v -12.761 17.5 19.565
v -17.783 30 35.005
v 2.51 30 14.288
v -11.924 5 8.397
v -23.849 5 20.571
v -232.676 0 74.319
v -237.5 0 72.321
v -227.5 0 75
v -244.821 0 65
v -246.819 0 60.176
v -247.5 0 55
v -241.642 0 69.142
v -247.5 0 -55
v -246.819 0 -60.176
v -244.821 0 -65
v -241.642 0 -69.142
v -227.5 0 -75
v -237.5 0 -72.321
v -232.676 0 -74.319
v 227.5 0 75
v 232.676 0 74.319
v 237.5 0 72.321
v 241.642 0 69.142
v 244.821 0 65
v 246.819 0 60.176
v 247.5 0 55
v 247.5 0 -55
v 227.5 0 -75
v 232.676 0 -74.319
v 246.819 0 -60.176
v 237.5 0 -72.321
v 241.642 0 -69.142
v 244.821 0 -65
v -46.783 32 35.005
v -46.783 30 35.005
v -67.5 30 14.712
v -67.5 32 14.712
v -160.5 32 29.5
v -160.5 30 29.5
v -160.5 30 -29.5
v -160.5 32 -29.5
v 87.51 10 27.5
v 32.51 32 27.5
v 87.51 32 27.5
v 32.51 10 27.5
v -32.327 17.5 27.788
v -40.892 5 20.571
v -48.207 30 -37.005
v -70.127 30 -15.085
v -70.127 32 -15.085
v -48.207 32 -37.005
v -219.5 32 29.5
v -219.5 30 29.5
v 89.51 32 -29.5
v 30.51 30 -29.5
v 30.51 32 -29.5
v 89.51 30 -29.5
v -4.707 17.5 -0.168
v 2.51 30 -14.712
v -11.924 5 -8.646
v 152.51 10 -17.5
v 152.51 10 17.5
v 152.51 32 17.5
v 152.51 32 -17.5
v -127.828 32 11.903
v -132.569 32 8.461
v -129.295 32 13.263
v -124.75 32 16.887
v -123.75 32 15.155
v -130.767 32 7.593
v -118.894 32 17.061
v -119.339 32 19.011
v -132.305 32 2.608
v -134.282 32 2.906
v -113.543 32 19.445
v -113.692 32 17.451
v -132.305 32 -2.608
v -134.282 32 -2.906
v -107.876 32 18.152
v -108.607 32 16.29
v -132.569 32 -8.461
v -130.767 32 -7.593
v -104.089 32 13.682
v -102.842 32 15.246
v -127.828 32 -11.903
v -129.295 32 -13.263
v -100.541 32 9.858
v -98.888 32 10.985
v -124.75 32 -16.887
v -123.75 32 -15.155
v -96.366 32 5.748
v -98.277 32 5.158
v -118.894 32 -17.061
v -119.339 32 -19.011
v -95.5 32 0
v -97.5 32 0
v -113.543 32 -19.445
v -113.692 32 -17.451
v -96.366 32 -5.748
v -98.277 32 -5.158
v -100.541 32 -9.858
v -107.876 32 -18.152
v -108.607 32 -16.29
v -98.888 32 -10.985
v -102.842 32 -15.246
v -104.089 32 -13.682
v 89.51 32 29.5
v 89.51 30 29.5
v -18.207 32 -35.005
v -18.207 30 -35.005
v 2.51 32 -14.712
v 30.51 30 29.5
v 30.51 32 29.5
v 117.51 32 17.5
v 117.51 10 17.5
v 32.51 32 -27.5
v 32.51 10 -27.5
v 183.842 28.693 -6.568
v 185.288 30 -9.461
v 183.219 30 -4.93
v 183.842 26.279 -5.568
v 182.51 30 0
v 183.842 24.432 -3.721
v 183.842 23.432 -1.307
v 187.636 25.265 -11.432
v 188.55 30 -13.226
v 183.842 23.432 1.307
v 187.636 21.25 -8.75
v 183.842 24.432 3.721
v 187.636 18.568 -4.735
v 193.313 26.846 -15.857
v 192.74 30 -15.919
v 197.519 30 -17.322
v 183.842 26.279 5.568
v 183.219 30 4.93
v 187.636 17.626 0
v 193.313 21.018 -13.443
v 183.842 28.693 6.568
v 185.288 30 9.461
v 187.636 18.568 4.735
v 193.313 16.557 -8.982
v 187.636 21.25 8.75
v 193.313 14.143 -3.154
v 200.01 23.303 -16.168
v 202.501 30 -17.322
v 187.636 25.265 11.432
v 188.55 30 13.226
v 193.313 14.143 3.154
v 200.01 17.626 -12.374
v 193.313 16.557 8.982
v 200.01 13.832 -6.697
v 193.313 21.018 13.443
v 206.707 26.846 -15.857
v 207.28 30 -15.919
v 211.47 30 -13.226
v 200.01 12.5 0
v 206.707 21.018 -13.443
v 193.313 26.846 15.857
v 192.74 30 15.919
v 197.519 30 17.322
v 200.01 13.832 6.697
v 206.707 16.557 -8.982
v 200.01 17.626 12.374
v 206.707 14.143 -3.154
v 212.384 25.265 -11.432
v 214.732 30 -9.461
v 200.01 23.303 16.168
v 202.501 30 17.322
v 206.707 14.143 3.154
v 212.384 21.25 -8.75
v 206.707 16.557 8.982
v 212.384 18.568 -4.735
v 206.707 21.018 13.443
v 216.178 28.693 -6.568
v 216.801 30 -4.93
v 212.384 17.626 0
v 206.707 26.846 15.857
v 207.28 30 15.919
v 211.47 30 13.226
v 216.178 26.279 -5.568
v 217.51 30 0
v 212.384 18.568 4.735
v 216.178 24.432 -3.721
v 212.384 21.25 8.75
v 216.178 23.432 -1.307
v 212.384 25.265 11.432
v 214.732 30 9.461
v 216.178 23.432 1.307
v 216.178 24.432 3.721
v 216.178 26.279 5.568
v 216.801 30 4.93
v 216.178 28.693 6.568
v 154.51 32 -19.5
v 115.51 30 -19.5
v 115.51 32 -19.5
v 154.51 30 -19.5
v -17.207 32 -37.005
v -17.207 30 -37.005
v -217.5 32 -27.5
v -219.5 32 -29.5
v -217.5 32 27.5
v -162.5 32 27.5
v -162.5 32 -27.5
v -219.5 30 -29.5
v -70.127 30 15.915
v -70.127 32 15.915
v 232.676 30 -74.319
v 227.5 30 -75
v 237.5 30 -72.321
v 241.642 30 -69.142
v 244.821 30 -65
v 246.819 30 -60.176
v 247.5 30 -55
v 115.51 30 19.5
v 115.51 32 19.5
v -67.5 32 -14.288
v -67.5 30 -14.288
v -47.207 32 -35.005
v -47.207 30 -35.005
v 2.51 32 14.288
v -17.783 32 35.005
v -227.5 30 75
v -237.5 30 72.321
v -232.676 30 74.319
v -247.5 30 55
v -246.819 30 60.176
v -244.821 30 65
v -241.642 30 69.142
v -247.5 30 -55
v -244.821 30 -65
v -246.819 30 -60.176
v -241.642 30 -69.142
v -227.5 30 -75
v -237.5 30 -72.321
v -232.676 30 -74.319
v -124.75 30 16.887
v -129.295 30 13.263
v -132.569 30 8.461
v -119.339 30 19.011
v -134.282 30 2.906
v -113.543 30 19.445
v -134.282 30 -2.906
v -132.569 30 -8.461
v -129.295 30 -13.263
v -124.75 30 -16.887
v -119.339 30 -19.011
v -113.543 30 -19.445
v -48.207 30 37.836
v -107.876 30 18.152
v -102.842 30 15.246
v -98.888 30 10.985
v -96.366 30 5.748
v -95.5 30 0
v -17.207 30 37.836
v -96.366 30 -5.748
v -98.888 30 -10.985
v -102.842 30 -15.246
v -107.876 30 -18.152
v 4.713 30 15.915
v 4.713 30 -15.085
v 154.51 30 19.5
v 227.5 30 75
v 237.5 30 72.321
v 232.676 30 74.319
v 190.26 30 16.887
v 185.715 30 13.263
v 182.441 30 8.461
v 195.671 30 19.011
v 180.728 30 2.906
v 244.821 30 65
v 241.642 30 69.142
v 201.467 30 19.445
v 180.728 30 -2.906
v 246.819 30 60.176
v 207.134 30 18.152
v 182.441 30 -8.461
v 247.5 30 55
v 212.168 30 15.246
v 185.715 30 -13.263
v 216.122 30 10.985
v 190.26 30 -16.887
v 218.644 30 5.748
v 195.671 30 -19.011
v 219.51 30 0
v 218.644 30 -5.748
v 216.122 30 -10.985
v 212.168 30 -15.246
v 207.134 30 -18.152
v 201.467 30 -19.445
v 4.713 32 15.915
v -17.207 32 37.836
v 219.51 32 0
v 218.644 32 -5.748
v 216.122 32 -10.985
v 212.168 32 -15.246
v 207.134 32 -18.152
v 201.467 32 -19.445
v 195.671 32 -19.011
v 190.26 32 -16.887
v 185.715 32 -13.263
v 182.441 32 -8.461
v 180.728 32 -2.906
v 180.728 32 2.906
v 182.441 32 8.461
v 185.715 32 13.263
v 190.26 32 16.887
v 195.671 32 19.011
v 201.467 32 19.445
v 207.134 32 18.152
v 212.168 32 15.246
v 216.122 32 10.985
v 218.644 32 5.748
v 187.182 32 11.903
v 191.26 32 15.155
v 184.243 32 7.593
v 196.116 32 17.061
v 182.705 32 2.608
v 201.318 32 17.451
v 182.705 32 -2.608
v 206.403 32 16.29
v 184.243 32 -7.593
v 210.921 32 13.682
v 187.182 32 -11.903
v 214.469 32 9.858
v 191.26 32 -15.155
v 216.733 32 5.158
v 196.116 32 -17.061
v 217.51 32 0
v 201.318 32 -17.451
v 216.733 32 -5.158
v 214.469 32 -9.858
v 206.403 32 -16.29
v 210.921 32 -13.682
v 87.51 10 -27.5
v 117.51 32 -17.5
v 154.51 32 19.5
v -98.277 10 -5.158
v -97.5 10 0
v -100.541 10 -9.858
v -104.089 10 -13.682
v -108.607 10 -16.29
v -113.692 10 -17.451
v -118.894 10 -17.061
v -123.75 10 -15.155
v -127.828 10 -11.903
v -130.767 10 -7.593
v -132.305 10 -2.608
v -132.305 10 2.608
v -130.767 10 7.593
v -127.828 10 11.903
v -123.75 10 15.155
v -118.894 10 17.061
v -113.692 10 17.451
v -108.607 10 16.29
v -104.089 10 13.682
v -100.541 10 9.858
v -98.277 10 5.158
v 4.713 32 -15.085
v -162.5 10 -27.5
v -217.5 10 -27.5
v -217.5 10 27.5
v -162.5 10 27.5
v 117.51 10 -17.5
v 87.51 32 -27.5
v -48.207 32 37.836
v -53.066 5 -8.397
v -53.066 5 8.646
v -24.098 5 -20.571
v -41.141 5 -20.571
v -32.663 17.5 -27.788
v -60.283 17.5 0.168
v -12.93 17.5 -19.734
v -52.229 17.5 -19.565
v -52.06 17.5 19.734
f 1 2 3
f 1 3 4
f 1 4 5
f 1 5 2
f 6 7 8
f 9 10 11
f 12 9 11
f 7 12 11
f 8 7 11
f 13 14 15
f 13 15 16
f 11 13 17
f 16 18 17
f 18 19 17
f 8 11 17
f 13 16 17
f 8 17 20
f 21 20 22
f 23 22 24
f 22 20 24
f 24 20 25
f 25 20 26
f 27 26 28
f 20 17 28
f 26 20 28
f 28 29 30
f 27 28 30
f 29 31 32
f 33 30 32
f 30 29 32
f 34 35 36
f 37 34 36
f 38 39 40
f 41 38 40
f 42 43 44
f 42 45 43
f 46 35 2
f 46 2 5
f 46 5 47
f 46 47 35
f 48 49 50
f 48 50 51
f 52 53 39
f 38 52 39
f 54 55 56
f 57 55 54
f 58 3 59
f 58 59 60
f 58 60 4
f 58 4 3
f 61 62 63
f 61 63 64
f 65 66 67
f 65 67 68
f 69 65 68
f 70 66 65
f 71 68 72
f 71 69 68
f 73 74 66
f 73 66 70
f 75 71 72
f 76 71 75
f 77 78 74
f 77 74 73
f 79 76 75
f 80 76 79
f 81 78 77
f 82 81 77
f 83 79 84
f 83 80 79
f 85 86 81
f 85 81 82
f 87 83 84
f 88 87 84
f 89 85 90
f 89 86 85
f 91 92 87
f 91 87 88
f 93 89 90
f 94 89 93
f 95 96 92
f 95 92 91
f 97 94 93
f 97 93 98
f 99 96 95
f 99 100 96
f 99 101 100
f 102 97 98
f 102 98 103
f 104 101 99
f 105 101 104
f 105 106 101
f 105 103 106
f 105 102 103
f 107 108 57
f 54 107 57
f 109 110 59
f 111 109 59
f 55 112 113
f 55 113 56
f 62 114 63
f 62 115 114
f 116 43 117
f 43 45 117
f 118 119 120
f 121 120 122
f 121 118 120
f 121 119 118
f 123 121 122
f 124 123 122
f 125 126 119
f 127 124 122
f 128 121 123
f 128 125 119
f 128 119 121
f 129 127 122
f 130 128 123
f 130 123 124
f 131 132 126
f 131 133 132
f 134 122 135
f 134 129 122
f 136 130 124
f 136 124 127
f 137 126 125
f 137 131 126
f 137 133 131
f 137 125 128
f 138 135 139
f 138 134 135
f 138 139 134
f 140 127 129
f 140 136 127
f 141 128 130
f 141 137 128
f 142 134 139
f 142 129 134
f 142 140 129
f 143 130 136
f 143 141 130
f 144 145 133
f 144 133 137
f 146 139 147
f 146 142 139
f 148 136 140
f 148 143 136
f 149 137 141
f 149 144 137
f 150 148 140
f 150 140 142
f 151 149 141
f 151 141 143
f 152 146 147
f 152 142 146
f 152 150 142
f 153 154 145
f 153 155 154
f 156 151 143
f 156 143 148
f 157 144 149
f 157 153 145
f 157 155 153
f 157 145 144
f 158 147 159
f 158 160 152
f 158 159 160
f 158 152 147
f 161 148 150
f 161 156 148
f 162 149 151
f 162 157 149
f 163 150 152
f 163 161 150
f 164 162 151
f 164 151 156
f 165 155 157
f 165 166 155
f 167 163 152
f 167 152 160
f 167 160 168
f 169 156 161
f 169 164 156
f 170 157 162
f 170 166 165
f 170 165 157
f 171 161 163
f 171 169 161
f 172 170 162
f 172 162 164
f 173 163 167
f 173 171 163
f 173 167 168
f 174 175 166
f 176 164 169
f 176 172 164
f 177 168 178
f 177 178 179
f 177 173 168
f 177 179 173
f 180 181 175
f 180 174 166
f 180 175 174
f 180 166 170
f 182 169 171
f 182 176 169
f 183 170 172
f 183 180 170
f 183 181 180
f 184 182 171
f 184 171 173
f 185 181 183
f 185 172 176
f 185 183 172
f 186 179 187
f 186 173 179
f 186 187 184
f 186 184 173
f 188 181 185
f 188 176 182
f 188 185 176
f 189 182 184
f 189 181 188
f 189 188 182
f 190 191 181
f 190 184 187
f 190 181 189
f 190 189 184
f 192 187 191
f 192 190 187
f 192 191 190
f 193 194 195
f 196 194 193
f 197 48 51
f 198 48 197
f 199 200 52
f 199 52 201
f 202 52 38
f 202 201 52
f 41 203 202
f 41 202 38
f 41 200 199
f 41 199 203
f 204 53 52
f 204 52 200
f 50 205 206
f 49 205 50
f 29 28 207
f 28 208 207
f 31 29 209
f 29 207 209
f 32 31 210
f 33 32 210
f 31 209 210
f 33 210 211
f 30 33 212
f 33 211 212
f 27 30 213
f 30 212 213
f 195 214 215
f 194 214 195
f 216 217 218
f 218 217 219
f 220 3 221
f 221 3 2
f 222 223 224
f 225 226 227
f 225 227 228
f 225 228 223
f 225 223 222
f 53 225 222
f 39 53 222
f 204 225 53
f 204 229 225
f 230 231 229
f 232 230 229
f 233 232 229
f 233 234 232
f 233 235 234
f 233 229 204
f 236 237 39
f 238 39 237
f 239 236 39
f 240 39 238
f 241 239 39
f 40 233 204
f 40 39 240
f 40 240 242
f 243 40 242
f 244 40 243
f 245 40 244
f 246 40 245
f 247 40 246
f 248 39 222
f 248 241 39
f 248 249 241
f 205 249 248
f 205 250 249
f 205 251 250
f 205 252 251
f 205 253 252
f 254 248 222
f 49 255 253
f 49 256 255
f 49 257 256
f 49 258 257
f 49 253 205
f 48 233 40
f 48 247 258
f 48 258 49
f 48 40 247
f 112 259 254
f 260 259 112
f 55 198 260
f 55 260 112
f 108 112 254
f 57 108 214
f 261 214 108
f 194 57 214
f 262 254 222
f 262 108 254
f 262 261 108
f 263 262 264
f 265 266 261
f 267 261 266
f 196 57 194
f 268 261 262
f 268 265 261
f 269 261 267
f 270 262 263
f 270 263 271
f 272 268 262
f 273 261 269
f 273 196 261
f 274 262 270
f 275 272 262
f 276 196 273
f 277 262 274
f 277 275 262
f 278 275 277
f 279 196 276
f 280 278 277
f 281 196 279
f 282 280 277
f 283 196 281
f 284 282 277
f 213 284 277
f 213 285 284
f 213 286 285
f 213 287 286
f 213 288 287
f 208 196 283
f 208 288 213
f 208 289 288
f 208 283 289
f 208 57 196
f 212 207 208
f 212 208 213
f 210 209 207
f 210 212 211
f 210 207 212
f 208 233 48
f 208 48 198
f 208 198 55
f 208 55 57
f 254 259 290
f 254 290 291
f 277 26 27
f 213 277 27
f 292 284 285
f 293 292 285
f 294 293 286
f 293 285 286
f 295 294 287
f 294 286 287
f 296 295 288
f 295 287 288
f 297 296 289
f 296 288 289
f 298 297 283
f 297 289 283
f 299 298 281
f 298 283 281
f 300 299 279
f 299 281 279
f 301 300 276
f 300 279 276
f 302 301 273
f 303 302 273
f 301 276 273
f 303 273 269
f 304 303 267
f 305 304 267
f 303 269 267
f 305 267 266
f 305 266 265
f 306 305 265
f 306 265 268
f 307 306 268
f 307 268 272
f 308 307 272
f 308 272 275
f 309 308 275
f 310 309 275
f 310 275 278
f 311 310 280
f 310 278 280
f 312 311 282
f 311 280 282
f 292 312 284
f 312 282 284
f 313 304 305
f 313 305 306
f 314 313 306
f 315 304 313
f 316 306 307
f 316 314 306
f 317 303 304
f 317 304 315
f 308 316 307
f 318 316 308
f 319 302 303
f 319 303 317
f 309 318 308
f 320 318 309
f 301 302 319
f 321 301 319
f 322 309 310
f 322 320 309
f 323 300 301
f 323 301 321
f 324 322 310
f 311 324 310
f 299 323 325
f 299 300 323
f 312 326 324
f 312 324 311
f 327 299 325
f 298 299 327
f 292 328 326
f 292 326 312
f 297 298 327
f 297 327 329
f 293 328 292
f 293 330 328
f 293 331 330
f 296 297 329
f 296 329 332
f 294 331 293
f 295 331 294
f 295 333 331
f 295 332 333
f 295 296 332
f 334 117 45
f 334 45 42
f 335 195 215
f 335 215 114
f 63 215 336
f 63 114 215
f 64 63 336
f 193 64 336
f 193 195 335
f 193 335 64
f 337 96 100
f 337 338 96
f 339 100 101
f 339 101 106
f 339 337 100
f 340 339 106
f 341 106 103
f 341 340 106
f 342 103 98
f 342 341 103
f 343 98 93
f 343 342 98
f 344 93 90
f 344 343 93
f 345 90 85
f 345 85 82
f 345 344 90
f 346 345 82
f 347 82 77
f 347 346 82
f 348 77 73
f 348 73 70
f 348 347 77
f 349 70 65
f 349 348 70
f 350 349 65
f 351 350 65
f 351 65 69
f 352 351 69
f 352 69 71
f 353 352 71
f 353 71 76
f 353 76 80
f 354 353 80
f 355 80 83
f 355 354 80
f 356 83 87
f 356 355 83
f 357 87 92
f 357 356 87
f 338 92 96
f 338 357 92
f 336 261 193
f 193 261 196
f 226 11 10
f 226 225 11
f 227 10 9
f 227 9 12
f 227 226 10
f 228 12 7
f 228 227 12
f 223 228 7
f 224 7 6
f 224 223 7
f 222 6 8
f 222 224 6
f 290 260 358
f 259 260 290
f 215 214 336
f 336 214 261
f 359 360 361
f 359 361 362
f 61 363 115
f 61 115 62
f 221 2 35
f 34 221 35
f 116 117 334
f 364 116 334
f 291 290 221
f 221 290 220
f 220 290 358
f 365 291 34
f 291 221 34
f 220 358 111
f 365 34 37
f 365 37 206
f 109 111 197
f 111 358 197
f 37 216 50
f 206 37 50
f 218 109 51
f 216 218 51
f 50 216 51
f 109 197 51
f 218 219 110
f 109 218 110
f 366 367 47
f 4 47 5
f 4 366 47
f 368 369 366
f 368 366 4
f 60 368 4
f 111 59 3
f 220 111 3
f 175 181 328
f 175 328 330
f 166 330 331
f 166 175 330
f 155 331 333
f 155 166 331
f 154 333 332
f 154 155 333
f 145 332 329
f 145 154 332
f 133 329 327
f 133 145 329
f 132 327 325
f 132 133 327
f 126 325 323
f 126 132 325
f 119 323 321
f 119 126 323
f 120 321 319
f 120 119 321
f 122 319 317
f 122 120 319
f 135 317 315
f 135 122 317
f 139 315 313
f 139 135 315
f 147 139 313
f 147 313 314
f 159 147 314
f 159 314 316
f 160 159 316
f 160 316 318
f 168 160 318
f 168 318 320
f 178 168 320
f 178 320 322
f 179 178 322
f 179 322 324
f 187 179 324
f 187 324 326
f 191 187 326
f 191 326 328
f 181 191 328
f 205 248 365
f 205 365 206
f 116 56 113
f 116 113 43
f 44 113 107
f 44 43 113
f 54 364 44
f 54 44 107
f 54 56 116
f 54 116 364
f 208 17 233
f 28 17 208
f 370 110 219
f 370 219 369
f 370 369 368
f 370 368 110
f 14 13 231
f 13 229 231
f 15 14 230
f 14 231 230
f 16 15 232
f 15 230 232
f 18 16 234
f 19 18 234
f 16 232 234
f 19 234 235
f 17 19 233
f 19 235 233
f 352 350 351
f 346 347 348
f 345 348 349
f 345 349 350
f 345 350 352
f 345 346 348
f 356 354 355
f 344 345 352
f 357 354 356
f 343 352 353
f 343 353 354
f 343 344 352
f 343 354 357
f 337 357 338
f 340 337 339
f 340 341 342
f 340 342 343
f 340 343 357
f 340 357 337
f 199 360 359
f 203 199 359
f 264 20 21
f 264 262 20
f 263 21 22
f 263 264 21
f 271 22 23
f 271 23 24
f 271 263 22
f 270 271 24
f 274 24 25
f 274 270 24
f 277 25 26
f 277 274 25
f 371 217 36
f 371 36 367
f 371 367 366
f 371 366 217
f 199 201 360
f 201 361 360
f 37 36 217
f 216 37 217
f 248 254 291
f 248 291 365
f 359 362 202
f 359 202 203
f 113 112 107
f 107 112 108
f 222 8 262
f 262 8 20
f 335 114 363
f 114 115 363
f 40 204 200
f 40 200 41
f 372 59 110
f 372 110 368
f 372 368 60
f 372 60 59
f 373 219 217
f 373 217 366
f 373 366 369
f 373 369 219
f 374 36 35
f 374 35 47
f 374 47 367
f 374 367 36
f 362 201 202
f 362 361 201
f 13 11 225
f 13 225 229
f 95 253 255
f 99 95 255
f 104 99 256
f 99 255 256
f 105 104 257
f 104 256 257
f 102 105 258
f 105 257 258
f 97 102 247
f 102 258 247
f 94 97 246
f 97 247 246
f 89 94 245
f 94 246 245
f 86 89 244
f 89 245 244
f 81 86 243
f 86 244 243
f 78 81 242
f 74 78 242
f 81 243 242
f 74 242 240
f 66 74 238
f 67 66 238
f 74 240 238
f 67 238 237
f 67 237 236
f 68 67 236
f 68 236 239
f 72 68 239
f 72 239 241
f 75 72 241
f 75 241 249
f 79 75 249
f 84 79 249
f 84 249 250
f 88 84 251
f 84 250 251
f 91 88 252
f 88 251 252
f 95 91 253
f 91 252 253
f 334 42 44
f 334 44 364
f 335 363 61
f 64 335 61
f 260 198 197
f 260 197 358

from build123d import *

# Parameters (mm, degrees)
SKETCH1_W           = 495
SKETCH1_H           = 150
BOSS_EXTRUDE1_DEPTH = 30
SKETCH2_R           = 17.5
SKETCH2_W           = 55
SKETCH2_H           = 55
CUT_EXTRUDE1_DEPTH  = 20
CUT_EXTRUDE2_DEPTH  = 25
CUT_EXTRUDE2_TAPER  = 30
SKETCH5_W           = 55
SKETCH5_H           = 55
SKETCH5_W_2         = 35
SKETCH5_H_2         = 35
CUT_EXTRUDE3_DEPTH  = 20
FILLET1_R           = 20
SKETCH8_W           = 59
SKETCH8_H           = 59
SKETCH8_W_2         = 55
SKETCH8_H_2         = 55
BOSS_EXTRUDE2_DEPTH = 2
SKETCH9_R           = 19.5
SKETCH9_R_2         = 17.5
BOSS_EXTRUDE3_DEPTH = 2
BOSS_EXTRUDE4_DEPTH = 2
SKETCH11_W          = 59
SKETCH11_H          = 59
SKETCH11_W_2        = 55
SKETCH11_H_2        = 55
BOSS_EXTRUDE6_DEPTH = 2
SKETCH12_W          = 39
SKETCH12_H          = 39
SKETCH12_W_2        = 35
SKETCH12_H_2        = 35
BOSS_EXTRUDE7_DEPTH = 2
SKETCH13_R          = 19.5
SKETCH13_R_2        = 17.5
BOSS_EXTRUDE8_DEPTH = 2


with BuildPart() as part:
    # Sketch1 → Boss-Extrude1 (new body)
    with BuildSketch(Plane(origin=(0, 0, 0), x_dir=(1, 0, 0), z_dir=(0, 1, 0))):
        Rectangle(SKETCH1_W, SKETCH1_H)
    extrude(amount=BOSS_EXTRUDE1_DEPTH)

    # Sketch2 → Cut-Extrude1 (cut)
    with BuildSketch(Plane(origin=(0, 30, 0), x_dir=(1, 0, 0), z_dir=(0, 1, 0))):
        with Locations((-115, 0)):
            Circle(SKETCH2_R)
        with Locations((-190, 0)):
            Rectangle(SKETCH2_W, SKETCH2_H)
    extrude(amount=-CUT_EXTRUDE1_DEPTH, mode=Mode.SUBTRACT)

    # Sketch4 → Cut-Extrude2 (cut)
    with BuildSketch(Plane(origin=(0, 30, 0), x_dir=(1, 0, 0), z_dir=(0, 1, 0))):
        Polygon((-67.5, 14.287926899), (-67.5, -14.712073101), (-46.782926899, -35.005), (-17.782926899, -35.005), (2.51, -14.287926899), (2.51, 14.712073101), (-18.207073101, 35.005), (-47.207073101, 35.005), align=None)
    extrude(amount=-CUT_EXTRUDE2_DEPTH, taper=CUT_EXTRUDE2_TAPER, mode=Mode.SUBTRACT)

    # Sketch5 → Cut-Extrude3 (cut)
    with BuildSketch(Plane(origin=(0, 30, 0), x_dir=(1, 0, 0), z_dir=(0, 1, 0))):
        with Locations((60.01, 0)):
            Rectangle(SKETCH5_W, SKETCH5_H)
        with Locations((135.01, 0)):
            Rectangle(SKETCH5_W_2, SKETCH5_H_2)
    extrude(amount=-CUT_EXTRUDE3_DEPTH, mode=Mode.SUBTRACT)

    # Sketch6 → Cut-Revolve1 (revolve, cut)
    with BuildSketch(Plane(origin=(0, 30, 0), x_dir=(1, 0, 0), z_dir=(0, 1, 0))):
        with BuildLine():
            Line((217.51, 0), (182.51, 0))
            ThreePointArc((182.51, 0), (200.01, 17.5), (217.51, 0))
        make_face()
    revolve(axis=Axis((217.51, 30, 0), (-1, 0, 0)), mode=Mode.SUBTRACT)

    # Fillet1
    fillet1_edges = [part.edges().sort_by_distance(p)[0] for p in [
        (247.5, 15, 75),
        (-247.5, 15, 75),
        (-247.5, 15, -75),
        (247.5, 15, -75),
    ]]
    fillet(fillet1_edges, radius=FILLET1_R)

    # Sketch8 → Boss-Extrude2 (add)
    with BuildSketch(Plane(origin=(0, 30, 0), x_dir=(1, 0, 0), z_dir=(0, 1, 0))):
        with Locations((-190, 0)):
            Rectangle(SKETCH8_W, SKETCH8_H)
        with Locations((-190, 0)):
            Rectangle(SKETCH8_W_2, SKETCH8_H_2, mode=Mode.SUBTRACT)
    extrude(amount=BOSS_EXTRUDE2_DEPTH)

    # Sketch9 → Boss-Extrude3 (add)
    with BuildSketch(Plane(origin=(0, 30, 0), x_dir=(1, 0, 0), z_dir=(0, 1, 0))):
        with Locations((-115, 0)):
            Circle(SKETCH9_R)
        with Locations((-115, 0)):
            Circle(SKETCH9_R_2, mode=Mode.SUBTRACT)
    extrude(amount=BOSS_EXTRUDE3_DEPTH)

    # Sketch10 → Boss-Extrude4 (add)
    with BuildSketch(Plane(origin=(0, 30, 0), x_dir=(1, 0, 0), z_dir=(0, 1, 0))):
        Polygon((-48.207073101, 37.005), (-17.207073101, 37.005), (4.713237116, 15.084689783), (4.713237116, -15.915310217), (-17.207073101, -37.835620434), (-48.207073101, -37.835620434), (-70.127383317, -15.915310217), (-70.127383317, 15.084689783), align=None)
        Polygon((-47.207073101, 35.005), (-18.207073101, 35.005), (2.51, 14.712073101), (2.51, -14.287926899), (-17.782926899, -35.005), (-46.782926899, -35.005), (-67.5, -14.712073101), (-67.5, 14.287926899), align=None, mode=Mode.SUBTRACT)
    extrude(amount=BOSS_EXTRUDE4_DEPTH)

    # Sketch11 → Boss-Extrude6 (add)
    with BuildSketch(Plane(origin=(0, 30, 0), x_dir=(1, 0, 0), z_dir=(0, 1, 0))):
        with Locations((60.01, 0)):
            Rectangle(SKETCH11_W, SKETCH11_H)
        with Locations((60.01, 0)):
            Rectangle(SKETCH11_W_2, SKETCH11_H_2, mode=Mode.SUBTRACT)
    extrude(amount=BOSS_EXTRUDE6_DEPTH)

    # Sketch12 → Boss-Extrude7 (add)
    with BuildSketch(Plane(origin=(0, 30, 0), x_dir=(1, 0, 0), z_dir=(0, 1, 0))):
        with Locations((135.01, 0)):
            Rectangle(SKETCH12_W, SKETCH12_H)
        with Locations((135.01, 0)):
            Rectangle(SKETCH12_W_2, SKETCH12_H_2, mode=Mode.SUBTRACT)
    extrude(amount=BOSS_EXTRUDE7_DEPTH)

    # Sketch13 → Boss-Extrude8 (add)
    with BuildSketch(Plane(origin=(0, 30, 0), x_dir=(1, 0, 0), z_dir=(0, 1, 0))):
        with Locations((200.01, 0)):
            Circle(SKETCH13_R)
        with Locations((200.01, 0)):
            Circle(SKETCH13_R_2, mode=Mode.SUBTRACT)
    extrude(amount=BOSS_EXTRUDE8_DEPTH)


solid = part.part
